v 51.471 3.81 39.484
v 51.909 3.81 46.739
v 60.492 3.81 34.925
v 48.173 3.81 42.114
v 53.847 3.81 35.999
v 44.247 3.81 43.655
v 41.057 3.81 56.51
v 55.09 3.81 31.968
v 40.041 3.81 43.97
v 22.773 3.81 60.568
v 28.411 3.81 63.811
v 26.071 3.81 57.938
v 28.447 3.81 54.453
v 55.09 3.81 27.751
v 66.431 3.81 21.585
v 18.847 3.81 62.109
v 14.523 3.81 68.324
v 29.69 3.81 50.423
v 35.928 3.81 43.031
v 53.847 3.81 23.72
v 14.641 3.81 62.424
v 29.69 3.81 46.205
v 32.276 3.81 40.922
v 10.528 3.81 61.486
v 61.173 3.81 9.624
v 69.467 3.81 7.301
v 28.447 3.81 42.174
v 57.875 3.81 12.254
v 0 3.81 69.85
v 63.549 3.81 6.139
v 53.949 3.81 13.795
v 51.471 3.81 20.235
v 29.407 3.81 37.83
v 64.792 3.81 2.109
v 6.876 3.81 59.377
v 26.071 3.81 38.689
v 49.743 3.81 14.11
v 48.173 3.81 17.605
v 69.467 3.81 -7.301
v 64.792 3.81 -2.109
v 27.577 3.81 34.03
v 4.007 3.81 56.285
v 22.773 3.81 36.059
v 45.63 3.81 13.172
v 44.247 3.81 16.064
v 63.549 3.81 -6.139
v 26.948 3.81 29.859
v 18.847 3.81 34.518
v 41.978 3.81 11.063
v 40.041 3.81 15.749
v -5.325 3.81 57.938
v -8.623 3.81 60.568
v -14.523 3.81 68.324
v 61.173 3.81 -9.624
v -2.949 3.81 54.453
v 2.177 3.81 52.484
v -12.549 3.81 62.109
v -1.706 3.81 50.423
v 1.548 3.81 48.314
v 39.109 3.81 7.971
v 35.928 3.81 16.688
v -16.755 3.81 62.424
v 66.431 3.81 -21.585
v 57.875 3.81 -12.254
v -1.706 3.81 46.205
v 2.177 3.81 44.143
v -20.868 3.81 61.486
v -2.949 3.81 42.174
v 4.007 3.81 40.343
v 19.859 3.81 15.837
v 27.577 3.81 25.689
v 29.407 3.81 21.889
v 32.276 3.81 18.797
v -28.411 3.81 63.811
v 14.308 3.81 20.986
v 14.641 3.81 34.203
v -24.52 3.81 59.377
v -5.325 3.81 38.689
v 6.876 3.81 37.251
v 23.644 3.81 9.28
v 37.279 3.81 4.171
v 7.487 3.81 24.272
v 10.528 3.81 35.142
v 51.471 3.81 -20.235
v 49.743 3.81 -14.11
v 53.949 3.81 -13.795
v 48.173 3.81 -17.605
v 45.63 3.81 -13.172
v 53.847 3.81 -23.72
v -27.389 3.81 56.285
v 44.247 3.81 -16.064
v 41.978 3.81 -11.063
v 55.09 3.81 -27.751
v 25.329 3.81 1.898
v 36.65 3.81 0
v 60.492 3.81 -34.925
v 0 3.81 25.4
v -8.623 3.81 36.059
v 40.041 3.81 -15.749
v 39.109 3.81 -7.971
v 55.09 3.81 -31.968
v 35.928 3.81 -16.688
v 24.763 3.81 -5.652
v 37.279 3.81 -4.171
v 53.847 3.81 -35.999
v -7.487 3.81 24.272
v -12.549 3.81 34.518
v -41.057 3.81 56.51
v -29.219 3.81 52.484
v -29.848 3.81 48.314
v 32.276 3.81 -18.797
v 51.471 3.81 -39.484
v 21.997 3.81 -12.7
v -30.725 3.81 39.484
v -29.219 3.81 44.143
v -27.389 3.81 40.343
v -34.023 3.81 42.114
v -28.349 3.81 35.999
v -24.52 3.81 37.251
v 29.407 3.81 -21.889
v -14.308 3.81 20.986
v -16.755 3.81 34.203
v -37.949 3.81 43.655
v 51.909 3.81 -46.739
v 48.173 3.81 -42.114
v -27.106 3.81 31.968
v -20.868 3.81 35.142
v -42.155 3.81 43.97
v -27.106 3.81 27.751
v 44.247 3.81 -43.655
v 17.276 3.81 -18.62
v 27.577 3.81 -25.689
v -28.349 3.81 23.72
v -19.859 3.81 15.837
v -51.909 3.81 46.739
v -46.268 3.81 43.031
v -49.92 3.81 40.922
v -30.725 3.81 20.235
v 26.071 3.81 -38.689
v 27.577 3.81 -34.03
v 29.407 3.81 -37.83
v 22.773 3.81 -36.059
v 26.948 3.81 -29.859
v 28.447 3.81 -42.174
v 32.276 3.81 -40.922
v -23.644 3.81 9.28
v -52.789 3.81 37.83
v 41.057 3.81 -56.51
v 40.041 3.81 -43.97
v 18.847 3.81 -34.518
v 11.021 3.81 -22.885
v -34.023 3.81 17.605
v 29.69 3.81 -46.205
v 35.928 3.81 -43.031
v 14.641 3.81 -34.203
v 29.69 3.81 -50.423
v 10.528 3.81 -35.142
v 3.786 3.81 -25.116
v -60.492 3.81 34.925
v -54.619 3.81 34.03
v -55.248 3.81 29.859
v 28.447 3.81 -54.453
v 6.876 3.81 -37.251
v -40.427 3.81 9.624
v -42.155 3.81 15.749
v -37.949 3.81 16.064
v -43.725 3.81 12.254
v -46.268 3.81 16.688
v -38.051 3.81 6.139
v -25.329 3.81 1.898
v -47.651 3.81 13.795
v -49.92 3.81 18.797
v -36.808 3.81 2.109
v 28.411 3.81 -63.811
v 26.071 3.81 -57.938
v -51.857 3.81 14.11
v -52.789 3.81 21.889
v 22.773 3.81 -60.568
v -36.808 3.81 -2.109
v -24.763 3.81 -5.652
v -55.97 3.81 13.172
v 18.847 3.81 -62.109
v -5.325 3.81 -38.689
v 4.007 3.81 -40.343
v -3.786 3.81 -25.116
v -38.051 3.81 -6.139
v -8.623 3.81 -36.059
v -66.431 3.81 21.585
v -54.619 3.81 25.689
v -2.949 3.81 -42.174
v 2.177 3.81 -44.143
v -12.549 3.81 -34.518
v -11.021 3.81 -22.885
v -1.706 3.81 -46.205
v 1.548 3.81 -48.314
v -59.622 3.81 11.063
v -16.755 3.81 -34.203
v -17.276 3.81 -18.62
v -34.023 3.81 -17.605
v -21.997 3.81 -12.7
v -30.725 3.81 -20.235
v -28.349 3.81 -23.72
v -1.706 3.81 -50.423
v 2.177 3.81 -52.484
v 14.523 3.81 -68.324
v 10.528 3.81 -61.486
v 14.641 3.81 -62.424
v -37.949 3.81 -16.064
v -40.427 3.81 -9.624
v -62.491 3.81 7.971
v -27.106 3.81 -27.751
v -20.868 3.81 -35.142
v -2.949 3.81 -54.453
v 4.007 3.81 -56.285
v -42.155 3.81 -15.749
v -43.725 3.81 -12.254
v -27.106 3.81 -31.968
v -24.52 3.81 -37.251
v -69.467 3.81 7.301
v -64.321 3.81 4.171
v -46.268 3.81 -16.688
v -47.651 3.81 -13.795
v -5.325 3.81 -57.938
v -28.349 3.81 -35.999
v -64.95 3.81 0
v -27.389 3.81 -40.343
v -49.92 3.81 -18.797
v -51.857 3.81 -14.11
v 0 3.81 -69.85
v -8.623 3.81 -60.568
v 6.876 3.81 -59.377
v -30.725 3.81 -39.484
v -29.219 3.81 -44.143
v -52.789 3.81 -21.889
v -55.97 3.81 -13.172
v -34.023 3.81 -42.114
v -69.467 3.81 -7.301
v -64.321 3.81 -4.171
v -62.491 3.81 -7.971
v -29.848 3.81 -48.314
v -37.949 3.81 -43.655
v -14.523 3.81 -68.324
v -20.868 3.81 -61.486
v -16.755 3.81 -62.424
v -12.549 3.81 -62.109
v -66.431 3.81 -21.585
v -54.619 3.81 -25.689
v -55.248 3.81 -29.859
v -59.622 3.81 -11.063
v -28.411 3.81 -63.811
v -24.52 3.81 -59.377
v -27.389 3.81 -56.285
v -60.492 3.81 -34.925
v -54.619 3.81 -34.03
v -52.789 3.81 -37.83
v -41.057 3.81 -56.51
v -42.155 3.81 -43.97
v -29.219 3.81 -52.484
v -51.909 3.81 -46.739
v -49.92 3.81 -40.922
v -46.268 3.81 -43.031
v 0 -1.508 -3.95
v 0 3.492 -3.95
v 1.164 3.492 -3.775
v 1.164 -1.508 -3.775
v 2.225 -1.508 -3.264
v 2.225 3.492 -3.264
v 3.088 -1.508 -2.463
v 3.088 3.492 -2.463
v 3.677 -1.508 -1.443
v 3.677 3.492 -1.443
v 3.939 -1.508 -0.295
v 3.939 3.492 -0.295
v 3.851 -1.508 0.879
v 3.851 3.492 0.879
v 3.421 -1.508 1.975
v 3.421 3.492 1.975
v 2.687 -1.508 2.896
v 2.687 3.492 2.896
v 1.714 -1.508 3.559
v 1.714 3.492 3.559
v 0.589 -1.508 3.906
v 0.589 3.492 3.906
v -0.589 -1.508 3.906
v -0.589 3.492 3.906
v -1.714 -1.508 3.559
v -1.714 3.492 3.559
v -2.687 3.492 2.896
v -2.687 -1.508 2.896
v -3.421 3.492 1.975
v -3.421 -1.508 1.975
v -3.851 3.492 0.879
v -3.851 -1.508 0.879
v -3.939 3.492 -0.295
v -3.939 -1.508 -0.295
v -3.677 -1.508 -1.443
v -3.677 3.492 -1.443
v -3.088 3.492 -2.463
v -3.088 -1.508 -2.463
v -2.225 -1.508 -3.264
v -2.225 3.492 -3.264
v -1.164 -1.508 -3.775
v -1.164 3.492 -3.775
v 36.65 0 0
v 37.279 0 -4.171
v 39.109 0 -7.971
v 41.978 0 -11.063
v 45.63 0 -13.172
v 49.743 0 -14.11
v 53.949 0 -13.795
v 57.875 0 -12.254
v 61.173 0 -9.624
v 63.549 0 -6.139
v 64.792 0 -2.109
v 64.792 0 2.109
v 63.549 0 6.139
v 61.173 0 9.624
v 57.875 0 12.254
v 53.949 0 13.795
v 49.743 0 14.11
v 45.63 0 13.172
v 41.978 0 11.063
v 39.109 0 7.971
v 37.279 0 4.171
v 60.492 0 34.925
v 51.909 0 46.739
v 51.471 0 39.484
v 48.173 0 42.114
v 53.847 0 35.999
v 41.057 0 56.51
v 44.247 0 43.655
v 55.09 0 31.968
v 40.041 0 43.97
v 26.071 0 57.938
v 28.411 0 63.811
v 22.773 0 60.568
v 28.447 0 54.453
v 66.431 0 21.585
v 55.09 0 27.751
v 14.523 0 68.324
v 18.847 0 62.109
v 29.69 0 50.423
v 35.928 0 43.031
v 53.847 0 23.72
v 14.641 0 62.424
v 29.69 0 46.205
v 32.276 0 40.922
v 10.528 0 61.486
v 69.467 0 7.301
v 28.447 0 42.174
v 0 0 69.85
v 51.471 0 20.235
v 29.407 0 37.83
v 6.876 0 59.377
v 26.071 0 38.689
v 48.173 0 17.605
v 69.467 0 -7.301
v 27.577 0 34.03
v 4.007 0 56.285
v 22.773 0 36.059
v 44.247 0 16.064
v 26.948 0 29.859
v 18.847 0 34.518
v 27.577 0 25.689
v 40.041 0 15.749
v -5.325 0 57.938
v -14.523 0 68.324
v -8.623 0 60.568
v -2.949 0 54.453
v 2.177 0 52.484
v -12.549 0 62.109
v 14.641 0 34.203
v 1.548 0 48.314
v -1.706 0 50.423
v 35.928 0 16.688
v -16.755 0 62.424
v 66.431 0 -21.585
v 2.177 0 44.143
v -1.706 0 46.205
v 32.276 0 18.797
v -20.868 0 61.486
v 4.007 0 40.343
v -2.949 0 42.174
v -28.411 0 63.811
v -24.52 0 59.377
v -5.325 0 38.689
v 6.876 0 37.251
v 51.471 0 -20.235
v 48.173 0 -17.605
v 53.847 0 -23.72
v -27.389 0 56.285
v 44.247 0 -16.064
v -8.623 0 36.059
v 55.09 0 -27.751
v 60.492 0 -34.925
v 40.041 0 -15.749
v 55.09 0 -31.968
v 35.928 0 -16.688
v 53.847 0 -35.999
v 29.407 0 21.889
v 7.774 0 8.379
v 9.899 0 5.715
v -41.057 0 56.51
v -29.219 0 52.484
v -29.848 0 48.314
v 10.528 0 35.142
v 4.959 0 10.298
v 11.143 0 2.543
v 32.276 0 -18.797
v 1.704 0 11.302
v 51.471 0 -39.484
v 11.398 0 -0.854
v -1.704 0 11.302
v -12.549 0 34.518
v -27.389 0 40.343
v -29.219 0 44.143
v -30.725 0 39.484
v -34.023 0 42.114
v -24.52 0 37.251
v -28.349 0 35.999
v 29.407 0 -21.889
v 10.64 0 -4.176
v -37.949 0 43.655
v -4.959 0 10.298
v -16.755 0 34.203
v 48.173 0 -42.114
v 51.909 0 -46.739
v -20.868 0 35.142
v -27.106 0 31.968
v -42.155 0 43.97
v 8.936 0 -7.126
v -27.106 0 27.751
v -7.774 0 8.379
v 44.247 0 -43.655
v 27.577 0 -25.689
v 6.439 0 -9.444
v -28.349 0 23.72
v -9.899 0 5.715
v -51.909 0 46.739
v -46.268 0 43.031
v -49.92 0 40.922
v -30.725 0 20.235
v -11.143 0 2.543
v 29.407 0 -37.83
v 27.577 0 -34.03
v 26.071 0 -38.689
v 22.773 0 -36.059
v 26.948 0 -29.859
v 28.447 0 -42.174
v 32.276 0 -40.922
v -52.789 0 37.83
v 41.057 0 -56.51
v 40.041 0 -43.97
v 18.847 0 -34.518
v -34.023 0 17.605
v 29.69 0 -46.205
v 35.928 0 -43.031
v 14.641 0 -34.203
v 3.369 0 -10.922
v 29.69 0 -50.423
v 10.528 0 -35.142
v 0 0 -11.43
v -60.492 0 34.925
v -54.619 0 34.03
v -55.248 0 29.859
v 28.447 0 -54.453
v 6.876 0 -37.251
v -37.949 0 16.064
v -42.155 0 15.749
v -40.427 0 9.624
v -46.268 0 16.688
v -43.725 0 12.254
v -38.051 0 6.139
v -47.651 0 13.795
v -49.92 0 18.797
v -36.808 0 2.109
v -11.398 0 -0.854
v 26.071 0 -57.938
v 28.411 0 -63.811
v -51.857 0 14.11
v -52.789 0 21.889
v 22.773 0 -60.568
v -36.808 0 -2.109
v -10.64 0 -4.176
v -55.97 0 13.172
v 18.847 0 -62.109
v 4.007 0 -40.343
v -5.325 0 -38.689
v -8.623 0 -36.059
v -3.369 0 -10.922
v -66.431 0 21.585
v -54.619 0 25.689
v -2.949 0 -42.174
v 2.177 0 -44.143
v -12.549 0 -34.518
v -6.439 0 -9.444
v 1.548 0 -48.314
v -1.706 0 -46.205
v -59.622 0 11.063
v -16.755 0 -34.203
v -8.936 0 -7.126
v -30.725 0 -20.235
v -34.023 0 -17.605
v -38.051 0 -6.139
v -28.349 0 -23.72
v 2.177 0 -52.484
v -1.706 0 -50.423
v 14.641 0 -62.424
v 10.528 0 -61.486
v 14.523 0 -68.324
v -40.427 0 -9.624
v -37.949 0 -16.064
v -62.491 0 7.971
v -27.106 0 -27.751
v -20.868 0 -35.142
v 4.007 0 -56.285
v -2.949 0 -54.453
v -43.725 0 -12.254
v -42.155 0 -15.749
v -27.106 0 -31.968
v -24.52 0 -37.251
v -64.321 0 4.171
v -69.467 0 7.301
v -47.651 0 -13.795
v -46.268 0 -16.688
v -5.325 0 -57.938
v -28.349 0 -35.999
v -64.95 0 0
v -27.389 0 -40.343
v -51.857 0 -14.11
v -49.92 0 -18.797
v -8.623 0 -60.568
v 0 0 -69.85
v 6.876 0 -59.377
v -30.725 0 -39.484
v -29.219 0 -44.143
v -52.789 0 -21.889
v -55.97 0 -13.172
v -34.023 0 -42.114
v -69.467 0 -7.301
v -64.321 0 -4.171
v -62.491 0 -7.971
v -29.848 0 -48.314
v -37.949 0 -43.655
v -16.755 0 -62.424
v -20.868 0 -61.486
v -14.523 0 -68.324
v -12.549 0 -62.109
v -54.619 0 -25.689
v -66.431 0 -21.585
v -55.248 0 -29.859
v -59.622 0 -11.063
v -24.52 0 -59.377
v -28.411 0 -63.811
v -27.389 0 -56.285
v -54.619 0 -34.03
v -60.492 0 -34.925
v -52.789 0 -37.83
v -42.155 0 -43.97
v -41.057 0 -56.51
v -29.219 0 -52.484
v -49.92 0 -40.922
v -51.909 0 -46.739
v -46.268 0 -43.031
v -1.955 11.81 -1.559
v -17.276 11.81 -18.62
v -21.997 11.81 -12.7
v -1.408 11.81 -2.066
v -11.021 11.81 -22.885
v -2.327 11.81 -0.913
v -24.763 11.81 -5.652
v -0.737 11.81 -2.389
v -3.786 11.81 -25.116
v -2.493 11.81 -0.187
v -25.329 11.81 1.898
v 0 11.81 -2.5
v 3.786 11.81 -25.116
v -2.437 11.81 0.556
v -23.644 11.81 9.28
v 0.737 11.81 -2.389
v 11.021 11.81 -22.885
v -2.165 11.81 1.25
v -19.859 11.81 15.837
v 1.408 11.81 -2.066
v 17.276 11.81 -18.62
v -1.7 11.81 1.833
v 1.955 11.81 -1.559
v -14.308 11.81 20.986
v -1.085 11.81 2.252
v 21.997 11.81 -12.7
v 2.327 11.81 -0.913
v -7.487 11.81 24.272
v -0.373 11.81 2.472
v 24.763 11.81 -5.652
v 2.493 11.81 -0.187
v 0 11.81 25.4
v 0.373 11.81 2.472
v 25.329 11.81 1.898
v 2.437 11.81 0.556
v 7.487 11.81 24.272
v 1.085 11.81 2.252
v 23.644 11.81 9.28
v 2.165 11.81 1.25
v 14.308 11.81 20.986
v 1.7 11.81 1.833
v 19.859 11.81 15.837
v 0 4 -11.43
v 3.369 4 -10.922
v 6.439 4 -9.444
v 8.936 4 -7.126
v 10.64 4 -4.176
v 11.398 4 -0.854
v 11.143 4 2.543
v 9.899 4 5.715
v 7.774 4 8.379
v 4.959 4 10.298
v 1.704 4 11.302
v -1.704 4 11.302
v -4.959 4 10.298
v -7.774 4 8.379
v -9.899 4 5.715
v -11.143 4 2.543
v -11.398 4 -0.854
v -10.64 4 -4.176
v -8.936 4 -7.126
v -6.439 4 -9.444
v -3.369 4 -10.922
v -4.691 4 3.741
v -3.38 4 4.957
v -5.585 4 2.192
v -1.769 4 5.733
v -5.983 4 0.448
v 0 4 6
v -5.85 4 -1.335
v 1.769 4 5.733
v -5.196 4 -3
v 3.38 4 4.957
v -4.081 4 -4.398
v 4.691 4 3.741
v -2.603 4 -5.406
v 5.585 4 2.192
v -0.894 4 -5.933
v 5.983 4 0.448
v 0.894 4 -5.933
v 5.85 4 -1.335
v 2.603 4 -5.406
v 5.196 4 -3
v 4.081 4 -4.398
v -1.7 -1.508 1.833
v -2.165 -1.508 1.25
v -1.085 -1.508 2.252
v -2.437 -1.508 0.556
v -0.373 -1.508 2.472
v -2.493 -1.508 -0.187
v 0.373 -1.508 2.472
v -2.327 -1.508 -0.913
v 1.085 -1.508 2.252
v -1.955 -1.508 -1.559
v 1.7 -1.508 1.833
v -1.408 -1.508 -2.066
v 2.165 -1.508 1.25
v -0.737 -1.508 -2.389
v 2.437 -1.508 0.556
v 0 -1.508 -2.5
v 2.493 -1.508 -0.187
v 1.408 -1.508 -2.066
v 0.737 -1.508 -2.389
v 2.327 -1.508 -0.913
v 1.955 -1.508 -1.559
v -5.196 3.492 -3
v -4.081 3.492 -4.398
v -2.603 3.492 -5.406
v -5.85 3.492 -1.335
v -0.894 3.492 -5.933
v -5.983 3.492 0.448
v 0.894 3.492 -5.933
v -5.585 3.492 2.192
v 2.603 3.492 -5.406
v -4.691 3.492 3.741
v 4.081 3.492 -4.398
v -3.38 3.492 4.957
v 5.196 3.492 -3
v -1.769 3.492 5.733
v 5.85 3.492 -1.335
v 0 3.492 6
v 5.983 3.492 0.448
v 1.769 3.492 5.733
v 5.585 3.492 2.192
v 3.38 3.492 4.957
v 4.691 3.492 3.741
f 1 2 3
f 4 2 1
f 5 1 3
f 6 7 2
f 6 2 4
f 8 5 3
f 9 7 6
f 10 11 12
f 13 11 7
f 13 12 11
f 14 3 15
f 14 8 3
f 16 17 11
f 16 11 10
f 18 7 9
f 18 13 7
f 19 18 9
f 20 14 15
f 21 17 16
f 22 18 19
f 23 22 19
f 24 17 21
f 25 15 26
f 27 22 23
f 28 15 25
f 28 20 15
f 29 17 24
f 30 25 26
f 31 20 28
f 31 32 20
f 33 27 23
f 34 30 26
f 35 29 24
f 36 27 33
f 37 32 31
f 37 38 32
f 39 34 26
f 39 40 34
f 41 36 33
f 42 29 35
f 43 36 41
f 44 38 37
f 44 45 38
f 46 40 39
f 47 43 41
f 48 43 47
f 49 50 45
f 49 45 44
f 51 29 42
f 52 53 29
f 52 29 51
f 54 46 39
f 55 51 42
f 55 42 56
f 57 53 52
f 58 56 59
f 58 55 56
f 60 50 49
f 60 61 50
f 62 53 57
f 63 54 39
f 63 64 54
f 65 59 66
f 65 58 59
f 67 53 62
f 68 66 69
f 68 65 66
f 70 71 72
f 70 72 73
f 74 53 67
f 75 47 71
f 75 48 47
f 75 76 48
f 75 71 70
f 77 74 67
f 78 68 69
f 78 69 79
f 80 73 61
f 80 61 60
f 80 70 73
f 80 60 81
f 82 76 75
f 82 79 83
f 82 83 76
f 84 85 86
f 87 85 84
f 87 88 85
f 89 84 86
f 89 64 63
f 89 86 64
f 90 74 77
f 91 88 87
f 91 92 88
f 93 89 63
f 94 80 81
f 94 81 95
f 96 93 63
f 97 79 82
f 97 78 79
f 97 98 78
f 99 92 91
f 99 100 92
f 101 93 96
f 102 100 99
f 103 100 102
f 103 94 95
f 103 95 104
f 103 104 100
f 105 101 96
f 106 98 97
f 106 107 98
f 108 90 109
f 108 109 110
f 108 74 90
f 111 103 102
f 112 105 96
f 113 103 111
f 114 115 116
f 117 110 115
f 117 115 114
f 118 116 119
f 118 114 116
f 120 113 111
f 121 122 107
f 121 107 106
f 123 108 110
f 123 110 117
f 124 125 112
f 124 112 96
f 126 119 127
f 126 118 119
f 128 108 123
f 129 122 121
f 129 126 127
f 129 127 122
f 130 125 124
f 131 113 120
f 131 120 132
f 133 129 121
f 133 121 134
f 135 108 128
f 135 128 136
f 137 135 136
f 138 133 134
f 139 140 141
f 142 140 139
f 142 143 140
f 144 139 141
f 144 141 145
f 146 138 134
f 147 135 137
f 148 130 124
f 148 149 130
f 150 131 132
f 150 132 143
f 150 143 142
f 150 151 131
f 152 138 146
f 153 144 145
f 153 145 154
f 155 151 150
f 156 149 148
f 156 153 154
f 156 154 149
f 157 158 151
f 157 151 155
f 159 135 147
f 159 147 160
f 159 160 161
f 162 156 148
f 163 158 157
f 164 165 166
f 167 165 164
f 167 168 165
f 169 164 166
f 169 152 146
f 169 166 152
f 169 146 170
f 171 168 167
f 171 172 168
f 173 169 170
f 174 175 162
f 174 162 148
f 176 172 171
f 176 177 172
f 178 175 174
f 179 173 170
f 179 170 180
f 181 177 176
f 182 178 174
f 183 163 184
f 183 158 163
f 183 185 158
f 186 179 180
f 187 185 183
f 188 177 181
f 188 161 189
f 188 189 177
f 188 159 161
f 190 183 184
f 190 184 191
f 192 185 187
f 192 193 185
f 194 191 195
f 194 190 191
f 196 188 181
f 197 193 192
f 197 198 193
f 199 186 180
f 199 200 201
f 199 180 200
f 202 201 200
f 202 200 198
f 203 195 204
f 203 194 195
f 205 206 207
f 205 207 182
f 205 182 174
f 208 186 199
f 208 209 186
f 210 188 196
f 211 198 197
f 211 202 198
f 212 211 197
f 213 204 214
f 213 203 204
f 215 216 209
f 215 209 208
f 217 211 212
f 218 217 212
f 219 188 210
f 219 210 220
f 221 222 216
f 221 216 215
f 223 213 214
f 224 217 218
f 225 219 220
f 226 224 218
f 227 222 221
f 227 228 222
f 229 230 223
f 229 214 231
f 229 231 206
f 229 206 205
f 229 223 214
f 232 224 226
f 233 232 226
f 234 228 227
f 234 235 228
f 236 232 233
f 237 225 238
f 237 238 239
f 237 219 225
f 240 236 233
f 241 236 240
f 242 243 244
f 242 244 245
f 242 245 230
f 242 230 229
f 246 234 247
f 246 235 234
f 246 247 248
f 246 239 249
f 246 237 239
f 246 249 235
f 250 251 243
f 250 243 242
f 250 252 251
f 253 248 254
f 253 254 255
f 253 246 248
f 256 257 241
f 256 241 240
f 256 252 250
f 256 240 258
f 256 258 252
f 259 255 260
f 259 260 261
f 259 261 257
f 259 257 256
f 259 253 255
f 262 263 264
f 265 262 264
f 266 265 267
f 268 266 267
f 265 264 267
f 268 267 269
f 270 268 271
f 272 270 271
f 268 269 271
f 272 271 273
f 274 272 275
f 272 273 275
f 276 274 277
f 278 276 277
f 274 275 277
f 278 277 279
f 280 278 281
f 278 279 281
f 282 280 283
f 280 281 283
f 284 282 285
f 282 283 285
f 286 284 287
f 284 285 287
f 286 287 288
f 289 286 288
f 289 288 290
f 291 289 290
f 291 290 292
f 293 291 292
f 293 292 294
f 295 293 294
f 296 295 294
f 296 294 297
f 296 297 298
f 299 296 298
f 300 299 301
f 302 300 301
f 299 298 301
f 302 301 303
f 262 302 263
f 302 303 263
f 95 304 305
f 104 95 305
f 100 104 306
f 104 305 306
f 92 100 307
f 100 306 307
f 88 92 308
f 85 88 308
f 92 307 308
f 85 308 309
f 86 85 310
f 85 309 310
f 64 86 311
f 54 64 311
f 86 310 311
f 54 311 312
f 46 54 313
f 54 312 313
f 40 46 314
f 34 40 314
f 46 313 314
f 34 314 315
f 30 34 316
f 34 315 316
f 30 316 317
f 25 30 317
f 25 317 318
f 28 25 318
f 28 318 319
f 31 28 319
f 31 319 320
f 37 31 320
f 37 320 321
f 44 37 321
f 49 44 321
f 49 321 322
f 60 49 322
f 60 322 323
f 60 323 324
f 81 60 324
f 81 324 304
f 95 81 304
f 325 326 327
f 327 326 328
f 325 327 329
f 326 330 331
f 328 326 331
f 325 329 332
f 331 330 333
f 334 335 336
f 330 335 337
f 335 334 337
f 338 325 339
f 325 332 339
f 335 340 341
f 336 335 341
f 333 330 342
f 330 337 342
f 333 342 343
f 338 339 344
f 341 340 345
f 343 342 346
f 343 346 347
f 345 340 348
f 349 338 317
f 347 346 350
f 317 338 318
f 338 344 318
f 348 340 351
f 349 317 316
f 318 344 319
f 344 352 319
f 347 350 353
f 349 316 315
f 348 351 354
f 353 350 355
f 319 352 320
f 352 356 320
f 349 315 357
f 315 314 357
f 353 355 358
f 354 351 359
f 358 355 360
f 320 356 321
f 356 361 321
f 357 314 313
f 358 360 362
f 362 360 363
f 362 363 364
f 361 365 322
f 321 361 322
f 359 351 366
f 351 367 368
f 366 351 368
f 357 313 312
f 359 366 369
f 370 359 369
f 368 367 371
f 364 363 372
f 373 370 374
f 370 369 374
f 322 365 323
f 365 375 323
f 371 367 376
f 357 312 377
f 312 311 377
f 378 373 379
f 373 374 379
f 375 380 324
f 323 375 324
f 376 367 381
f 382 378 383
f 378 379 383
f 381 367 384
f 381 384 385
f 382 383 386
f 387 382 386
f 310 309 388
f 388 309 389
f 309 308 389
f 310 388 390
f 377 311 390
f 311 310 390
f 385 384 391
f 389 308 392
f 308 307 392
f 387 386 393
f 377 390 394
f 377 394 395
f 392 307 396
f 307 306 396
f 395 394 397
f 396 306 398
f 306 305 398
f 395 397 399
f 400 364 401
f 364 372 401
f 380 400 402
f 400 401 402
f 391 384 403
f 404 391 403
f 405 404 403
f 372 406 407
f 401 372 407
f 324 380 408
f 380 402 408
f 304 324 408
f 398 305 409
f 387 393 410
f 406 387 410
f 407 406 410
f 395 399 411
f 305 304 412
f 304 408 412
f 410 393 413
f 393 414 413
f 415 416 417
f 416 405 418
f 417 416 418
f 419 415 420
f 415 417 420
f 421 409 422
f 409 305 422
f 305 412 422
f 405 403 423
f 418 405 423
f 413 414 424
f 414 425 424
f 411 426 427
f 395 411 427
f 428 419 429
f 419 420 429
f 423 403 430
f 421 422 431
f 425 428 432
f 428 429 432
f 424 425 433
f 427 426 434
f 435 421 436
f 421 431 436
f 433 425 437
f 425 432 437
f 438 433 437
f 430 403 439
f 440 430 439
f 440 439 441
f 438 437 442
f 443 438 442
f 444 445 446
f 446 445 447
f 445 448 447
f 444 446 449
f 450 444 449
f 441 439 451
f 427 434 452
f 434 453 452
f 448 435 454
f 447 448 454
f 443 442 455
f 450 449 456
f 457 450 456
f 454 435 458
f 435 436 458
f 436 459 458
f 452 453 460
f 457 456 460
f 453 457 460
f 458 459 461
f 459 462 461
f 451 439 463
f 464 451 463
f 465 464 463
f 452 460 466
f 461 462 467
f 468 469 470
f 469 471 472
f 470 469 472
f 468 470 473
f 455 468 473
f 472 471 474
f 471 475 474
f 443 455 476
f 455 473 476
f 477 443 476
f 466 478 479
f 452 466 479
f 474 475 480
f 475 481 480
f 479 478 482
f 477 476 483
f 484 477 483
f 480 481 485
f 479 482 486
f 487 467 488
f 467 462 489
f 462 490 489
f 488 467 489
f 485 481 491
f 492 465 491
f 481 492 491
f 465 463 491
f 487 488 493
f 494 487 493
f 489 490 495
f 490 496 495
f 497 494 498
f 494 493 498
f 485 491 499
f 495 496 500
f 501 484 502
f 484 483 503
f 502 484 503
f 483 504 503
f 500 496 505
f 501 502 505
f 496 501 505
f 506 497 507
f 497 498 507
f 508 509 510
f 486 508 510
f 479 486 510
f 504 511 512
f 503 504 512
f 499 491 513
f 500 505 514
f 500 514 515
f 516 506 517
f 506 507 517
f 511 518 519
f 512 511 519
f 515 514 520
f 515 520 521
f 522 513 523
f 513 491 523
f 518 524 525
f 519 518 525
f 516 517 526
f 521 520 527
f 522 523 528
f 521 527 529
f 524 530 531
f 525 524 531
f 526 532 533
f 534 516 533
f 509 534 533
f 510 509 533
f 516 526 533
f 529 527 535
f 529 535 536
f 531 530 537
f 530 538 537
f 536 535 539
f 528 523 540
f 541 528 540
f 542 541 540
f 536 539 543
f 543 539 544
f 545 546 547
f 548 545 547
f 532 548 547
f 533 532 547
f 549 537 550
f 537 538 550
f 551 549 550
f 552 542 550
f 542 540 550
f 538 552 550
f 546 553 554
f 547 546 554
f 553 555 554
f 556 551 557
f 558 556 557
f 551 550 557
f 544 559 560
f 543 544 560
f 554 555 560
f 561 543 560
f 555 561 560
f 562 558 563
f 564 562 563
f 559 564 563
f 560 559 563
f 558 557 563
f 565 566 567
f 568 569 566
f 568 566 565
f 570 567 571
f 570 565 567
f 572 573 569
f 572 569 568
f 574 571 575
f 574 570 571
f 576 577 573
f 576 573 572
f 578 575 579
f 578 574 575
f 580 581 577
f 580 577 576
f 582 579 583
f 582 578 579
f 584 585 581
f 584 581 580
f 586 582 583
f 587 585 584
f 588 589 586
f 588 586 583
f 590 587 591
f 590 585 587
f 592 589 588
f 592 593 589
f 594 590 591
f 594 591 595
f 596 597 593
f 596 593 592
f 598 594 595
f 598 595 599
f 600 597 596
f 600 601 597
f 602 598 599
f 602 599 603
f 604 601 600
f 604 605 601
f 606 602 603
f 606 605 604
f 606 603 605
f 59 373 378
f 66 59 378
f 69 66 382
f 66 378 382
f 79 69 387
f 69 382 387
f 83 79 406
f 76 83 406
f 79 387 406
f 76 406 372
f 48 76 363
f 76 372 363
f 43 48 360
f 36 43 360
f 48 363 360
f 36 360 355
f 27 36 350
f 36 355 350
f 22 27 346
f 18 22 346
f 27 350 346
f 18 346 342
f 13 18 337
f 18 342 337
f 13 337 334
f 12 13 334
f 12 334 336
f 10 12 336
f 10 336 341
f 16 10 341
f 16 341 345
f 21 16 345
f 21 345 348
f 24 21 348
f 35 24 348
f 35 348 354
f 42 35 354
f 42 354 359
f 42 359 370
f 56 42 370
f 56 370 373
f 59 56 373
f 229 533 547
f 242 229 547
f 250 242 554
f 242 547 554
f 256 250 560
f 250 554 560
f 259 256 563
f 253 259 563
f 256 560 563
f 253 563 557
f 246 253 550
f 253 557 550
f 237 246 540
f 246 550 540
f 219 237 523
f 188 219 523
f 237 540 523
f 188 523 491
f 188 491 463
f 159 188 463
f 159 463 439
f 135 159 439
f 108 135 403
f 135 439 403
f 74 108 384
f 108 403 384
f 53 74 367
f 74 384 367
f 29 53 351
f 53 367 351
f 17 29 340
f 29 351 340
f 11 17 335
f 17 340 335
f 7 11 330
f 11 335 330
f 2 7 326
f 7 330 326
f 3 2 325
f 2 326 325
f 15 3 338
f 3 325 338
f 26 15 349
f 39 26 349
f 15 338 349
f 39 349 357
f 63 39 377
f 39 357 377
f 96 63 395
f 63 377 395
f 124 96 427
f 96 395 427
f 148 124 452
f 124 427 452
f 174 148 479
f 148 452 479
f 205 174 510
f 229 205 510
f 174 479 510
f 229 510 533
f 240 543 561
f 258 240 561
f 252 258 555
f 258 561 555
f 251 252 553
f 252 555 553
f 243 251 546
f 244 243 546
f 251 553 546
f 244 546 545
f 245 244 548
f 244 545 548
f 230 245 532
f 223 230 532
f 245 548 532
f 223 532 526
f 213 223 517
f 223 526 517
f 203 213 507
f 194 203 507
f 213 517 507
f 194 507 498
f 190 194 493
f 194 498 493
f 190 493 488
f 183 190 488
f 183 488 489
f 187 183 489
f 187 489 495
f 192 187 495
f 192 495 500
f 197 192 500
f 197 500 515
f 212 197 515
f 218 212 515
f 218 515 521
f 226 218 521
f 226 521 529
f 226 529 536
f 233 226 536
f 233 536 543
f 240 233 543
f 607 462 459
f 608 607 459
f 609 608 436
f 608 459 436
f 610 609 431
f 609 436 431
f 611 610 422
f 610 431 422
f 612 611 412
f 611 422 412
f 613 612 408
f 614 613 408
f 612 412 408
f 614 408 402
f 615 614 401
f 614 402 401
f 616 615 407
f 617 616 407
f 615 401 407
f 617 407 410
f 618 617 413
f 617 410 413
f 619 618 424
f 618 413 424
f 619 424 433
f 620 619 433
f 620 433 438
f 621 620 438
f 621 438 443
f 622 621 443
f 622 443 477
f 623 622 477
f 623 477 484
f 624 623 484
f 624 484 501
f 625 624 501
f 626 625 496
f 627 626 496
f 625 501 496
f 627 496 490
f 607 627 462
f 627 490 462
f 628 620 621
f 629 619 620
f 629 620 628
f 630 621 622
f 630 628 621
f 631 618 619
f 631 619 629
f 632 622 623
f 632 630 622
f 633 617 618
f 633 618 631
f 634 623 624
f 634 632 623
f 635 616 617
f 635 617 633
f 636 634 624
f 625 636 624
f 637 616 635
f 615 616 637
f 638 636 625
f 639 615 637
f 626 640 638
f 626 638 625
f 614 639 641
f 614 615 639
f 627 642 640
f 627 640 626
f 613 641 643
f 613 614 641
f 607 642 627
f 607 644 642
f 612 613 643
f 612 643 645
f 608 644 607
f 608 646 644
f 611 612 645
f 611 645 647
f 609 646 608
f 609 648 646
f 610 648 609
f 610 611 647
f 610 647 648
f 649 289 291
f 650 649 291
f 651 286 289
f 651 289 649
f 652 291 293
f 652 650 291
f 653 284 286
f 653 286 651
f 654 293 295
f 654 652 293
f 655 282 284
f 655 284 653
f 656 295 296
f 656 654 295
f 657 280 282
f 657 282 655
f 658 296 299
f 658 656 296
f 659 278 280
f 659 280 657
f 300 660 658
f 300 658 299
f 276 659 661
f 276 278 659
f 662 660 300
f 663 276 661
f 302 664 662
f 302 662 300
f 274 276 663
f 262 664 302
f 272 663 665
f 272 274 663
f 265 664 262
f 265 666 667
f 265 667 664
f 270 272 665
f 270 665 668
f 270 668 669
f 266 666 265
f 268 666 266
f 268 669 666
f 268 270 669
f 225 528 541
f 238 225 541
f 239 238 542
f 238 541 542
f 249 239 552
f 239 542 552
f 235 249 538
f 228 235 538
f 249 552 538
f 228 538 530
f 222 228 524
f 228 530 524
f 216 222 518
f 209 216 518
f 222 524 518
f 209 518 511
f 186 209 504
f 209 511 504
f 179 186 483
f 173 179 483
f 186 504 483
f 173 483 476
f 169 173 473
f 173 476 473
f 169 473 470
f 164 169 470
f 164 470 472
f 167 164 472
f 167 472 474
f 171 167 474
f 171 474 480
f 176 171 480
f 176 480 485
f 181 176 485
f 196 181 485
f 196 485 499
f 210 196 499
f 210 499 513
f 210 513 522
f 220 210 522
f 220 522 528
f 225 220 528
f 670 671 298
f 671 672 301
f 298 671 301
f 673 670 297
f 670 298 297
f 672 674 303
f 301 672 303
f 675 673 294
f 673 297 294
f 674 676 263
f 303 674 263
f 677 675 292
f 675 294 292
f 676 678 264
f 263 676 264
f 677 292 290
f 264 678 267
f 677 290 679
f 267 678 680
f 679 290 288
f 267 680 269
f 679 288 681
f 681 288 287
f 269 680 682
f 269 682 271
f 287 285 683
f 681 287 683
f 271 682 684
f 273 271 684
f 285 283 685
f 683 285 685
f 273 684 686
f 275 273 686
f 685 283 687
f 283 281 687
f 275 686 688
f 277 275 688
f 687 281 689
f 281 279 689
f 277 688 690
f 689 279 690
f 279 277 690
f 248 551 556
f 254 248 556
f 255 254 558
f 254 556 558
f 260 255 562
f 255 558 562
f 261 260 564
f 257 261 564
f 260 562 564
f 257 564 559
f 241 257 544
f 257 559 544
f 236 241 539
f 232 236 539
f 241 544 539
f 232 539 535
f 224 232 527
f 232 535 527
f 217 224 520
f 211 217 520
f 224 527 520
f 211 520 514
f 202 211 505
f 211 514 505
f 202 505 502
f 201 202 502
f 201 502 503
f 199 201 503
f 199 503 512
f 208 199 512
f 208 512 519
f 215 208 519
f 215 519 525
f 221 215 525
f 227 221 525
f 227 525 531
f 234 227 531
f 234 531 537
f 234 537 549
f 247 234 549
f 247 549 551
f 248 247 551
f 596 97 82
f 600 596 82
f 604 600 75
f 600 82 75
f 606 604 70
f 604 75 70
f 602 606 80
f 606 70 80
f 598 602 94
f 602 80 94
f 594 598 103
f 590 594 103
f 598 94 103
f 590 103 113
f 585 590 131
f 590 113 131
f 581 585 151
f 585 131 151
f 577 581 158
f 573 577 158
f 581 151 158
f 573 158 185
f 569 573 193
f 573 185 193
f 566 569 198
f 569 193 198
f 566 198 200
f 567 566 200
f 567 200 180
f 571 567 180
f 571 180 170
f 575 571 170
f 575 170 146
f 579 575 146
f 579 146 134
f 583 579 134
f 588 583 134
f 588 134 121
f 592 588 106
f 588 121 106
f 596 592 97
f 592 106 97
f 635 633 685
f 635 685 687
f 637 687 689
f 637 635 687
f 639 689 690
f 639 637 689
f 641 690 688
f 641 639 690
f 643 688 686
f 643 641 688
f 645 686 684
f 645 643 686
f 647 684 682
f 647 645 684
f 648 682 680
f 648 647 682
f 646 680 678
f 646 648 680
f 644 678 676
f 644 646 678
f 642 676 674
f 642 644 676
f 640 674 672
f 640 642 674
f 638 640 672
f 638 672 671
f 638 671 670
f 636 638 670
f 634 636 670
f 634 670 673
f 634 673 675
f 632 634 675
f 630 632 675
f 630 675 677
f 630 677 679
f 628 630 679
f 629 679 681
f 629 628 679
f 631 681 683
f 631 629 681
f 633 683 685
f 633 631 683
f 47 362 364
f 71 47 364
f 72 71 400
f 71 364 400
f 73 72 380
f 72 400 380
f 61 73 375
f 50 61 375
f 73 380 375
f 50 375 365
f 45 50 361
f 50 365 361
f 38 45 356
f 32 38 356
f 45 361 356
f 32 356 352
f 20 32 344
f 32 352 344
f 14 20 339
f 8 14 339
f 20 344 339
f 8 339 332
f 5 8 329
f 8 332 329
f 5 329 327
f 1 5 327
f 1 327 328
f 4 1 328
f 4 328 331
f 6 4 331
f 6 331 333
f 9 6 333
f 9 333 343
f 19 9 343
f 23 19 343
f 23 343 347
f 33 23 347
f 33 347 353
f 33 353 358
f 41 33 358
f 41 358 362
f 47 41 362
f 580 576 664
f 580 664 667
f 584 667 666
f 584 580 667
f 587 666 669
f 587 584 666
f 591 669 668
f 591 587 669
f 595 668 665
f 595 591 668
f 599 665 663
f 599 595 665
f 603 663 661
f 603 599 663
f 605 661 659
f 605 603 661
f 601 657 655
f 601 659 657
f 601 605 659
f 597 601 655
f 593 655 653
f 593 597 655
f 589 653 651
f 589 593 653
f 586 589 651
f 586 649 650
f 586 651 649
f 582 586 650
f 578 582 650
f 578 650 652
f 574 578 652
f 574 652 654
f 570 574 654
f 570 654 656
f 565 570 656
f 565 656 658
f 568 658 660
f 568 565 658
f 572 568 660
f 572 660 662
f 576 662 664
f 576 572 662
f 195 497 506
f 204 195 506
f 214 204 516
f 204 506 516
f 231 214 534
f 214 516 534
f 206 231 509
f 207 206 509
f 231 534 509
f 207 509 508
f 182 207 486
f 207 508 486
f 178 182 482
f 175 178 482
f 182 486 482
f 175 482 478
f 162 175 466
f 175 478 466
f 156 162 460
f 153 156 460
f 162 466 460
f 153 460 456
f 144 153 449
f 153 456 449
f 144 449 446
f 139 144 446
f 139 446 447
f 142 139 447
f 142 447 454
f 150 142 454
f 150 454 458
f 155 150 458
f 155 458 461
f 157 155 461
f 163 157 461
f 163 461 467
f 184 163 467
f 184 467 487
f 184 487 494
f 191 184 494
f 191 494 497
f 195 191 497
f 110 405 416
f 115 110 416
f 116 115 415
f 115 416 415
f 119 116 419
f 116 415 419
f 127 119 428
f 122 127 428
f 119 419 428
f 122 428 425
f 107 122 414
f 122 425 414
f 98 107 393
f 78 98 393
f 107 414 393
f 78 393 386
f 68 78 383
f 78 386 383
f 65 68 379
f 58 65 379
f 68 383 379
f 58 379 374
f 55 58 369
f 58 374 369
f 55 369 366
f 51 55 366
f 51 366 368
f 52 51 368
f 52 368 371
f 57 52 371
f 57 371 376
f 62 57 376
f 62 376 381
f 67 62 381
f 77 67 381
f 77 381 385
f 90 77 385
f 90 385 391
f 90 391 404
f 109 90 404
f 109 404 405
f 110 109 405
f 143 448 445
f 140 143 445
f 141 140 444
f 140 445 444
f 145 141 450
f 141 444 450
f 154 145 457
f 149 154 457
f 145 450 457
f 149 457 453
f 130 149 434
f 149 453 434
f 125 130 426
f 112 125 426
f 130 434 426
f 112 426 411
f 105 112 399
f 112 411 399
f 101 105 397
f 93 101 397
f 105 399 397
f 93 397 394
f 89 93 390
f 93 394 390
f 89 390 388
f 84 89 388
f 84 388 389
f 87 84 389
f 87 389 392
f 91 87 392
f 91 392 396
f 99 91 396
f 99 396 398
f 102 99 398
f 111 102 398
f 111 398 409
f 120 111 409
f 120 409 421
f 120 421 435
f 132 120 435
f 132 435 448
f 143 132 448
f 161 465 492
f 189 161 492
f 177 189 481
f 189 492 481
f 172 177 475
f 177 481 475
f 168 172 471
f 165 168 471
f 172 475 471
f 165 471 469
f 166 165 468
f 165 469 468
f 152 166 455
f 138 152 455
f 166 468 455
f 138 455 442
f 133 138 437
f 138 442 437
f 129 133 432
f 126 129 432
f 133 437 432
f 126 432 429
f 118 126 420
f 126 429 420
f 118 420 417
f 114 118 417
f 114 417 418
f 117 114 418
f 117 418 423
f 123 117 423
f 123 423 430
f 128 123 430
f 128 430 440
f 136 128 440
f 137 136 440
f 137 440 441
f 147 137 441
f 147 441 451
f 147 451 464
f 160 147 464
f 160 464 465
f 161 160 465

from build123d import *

# Parameters (mm, degrees)
SKETCH1_R                      = 69.85
BOSS_EXTRUDE1_DEPTH            = 3.81
SKETCH4_R                      = 25.4
BOSS_EXTRUDE5_DEPTH            = 7.99999997
SKETCH25_R                     = 11.43
CUT_EXTRUDE4_DEPTH             = 3.99999997
SKETCH5_R                      = 6
BOSS_EXTRUDE6_DEPTH            = 0.508
SKETCH26_R                     = 3.95
BOSS_EXTRUDE7_DEPTH            = 5
CUT_EXTRUDE1_DEPTH             = 100.486285986
CUT_EXTRUDE1_DEPTH_BACK        = 100.486285986
SKETCH6_R                      = 2.5
TAP_DRILL_FOR_M1_2X0_25_TAP1_D = 28.3


with BuildPart() as part:
    # Sketch1 → Boss-Extrude1 (new body)
    with BuildSketch(Plane(origin=(0, 0, 0), x_dir=(1, 0, 0), z_dir=(0, 1, 0))):
        Circle(SKETCH1_R)
    extrude(amount=BOSS_EXTRUDE1_DEPTH)

    # Sketch4 → Boss-Extrude5 (add)
    with BuildSketch(Plane(origin=(0, 3.81, 0), x_dir=(1, 0, 0), z_dir=(0, 1, 0))):
        Circle(SKETCH4_R)
    extrude(amount=BOSS_EXTRUDE5_DEPTH)

    # Sketch25 → Cut-Extrude4 (cut)
    with BuildSketch(Plane.XZ):
        Circle(SKETCH25_R)
    extrude(amount=-CUT_EXTRUDE4_DEPTH, mode=Mode.SUBTRACT)

    # Sketch5 → Boss-Extrude6 (add)
    with BuildSketch(Plane(origin=(0, 3.99999997, 0), x_dir=(1, 0, 0), z_dir=(0, 1, 0))):
        Circle(SKETCH5_R)
    extrude(amount=-BOSS_EXTRUDE6_DEPTH)

    # Sketch26 → Boss-Extrude7 (add)
    with BuildSketch(Plane.XZ.offset(-3.49199997)):
        Circle(SKETCH26_R)
    extrude(amount=BOSS_EXTRUDE7_DEPTH)

    # Sketch6 → Cut-Extrude1 (cut, two sides: drawn at the far end of the back side and taken through both)
    with BuildSketch(Plane.XZ.offset(-CUT_EXTRUDE1_DEPTH_BACK)):
        Circle(SKETCH6_R)
    extrude(amount=CUT_EXTRUDE1_DEPTH + CUT_EXTRUDE1_DEPTH_BACK, mode=Mode.SUBTRACT)

    # Tap Drill for M1.2x0.25 Tap1 (through all)
    with Locations(Plane(origin=(0, 3.81, 0), x_dir=(1, 0, 0), z_dir=(0, 1, 0))):
        with Locations((-50.8, 0), (-41.098063314, 29.859490816), (-15.698063314, 48.313671028), (15.698063314, 48.313671028), (41.098063314, 29.859490816), (50.8, 0), (41.098063314, -29.859490816), (15.698063314, -48.313671028), (-15.698063314, -48.313671028), (-41.098063314, -29.859490816)):
            Hole(TAP_DRILL_FOR_M1_2X0_25_TAP1_D / 2)


solid = part.part
